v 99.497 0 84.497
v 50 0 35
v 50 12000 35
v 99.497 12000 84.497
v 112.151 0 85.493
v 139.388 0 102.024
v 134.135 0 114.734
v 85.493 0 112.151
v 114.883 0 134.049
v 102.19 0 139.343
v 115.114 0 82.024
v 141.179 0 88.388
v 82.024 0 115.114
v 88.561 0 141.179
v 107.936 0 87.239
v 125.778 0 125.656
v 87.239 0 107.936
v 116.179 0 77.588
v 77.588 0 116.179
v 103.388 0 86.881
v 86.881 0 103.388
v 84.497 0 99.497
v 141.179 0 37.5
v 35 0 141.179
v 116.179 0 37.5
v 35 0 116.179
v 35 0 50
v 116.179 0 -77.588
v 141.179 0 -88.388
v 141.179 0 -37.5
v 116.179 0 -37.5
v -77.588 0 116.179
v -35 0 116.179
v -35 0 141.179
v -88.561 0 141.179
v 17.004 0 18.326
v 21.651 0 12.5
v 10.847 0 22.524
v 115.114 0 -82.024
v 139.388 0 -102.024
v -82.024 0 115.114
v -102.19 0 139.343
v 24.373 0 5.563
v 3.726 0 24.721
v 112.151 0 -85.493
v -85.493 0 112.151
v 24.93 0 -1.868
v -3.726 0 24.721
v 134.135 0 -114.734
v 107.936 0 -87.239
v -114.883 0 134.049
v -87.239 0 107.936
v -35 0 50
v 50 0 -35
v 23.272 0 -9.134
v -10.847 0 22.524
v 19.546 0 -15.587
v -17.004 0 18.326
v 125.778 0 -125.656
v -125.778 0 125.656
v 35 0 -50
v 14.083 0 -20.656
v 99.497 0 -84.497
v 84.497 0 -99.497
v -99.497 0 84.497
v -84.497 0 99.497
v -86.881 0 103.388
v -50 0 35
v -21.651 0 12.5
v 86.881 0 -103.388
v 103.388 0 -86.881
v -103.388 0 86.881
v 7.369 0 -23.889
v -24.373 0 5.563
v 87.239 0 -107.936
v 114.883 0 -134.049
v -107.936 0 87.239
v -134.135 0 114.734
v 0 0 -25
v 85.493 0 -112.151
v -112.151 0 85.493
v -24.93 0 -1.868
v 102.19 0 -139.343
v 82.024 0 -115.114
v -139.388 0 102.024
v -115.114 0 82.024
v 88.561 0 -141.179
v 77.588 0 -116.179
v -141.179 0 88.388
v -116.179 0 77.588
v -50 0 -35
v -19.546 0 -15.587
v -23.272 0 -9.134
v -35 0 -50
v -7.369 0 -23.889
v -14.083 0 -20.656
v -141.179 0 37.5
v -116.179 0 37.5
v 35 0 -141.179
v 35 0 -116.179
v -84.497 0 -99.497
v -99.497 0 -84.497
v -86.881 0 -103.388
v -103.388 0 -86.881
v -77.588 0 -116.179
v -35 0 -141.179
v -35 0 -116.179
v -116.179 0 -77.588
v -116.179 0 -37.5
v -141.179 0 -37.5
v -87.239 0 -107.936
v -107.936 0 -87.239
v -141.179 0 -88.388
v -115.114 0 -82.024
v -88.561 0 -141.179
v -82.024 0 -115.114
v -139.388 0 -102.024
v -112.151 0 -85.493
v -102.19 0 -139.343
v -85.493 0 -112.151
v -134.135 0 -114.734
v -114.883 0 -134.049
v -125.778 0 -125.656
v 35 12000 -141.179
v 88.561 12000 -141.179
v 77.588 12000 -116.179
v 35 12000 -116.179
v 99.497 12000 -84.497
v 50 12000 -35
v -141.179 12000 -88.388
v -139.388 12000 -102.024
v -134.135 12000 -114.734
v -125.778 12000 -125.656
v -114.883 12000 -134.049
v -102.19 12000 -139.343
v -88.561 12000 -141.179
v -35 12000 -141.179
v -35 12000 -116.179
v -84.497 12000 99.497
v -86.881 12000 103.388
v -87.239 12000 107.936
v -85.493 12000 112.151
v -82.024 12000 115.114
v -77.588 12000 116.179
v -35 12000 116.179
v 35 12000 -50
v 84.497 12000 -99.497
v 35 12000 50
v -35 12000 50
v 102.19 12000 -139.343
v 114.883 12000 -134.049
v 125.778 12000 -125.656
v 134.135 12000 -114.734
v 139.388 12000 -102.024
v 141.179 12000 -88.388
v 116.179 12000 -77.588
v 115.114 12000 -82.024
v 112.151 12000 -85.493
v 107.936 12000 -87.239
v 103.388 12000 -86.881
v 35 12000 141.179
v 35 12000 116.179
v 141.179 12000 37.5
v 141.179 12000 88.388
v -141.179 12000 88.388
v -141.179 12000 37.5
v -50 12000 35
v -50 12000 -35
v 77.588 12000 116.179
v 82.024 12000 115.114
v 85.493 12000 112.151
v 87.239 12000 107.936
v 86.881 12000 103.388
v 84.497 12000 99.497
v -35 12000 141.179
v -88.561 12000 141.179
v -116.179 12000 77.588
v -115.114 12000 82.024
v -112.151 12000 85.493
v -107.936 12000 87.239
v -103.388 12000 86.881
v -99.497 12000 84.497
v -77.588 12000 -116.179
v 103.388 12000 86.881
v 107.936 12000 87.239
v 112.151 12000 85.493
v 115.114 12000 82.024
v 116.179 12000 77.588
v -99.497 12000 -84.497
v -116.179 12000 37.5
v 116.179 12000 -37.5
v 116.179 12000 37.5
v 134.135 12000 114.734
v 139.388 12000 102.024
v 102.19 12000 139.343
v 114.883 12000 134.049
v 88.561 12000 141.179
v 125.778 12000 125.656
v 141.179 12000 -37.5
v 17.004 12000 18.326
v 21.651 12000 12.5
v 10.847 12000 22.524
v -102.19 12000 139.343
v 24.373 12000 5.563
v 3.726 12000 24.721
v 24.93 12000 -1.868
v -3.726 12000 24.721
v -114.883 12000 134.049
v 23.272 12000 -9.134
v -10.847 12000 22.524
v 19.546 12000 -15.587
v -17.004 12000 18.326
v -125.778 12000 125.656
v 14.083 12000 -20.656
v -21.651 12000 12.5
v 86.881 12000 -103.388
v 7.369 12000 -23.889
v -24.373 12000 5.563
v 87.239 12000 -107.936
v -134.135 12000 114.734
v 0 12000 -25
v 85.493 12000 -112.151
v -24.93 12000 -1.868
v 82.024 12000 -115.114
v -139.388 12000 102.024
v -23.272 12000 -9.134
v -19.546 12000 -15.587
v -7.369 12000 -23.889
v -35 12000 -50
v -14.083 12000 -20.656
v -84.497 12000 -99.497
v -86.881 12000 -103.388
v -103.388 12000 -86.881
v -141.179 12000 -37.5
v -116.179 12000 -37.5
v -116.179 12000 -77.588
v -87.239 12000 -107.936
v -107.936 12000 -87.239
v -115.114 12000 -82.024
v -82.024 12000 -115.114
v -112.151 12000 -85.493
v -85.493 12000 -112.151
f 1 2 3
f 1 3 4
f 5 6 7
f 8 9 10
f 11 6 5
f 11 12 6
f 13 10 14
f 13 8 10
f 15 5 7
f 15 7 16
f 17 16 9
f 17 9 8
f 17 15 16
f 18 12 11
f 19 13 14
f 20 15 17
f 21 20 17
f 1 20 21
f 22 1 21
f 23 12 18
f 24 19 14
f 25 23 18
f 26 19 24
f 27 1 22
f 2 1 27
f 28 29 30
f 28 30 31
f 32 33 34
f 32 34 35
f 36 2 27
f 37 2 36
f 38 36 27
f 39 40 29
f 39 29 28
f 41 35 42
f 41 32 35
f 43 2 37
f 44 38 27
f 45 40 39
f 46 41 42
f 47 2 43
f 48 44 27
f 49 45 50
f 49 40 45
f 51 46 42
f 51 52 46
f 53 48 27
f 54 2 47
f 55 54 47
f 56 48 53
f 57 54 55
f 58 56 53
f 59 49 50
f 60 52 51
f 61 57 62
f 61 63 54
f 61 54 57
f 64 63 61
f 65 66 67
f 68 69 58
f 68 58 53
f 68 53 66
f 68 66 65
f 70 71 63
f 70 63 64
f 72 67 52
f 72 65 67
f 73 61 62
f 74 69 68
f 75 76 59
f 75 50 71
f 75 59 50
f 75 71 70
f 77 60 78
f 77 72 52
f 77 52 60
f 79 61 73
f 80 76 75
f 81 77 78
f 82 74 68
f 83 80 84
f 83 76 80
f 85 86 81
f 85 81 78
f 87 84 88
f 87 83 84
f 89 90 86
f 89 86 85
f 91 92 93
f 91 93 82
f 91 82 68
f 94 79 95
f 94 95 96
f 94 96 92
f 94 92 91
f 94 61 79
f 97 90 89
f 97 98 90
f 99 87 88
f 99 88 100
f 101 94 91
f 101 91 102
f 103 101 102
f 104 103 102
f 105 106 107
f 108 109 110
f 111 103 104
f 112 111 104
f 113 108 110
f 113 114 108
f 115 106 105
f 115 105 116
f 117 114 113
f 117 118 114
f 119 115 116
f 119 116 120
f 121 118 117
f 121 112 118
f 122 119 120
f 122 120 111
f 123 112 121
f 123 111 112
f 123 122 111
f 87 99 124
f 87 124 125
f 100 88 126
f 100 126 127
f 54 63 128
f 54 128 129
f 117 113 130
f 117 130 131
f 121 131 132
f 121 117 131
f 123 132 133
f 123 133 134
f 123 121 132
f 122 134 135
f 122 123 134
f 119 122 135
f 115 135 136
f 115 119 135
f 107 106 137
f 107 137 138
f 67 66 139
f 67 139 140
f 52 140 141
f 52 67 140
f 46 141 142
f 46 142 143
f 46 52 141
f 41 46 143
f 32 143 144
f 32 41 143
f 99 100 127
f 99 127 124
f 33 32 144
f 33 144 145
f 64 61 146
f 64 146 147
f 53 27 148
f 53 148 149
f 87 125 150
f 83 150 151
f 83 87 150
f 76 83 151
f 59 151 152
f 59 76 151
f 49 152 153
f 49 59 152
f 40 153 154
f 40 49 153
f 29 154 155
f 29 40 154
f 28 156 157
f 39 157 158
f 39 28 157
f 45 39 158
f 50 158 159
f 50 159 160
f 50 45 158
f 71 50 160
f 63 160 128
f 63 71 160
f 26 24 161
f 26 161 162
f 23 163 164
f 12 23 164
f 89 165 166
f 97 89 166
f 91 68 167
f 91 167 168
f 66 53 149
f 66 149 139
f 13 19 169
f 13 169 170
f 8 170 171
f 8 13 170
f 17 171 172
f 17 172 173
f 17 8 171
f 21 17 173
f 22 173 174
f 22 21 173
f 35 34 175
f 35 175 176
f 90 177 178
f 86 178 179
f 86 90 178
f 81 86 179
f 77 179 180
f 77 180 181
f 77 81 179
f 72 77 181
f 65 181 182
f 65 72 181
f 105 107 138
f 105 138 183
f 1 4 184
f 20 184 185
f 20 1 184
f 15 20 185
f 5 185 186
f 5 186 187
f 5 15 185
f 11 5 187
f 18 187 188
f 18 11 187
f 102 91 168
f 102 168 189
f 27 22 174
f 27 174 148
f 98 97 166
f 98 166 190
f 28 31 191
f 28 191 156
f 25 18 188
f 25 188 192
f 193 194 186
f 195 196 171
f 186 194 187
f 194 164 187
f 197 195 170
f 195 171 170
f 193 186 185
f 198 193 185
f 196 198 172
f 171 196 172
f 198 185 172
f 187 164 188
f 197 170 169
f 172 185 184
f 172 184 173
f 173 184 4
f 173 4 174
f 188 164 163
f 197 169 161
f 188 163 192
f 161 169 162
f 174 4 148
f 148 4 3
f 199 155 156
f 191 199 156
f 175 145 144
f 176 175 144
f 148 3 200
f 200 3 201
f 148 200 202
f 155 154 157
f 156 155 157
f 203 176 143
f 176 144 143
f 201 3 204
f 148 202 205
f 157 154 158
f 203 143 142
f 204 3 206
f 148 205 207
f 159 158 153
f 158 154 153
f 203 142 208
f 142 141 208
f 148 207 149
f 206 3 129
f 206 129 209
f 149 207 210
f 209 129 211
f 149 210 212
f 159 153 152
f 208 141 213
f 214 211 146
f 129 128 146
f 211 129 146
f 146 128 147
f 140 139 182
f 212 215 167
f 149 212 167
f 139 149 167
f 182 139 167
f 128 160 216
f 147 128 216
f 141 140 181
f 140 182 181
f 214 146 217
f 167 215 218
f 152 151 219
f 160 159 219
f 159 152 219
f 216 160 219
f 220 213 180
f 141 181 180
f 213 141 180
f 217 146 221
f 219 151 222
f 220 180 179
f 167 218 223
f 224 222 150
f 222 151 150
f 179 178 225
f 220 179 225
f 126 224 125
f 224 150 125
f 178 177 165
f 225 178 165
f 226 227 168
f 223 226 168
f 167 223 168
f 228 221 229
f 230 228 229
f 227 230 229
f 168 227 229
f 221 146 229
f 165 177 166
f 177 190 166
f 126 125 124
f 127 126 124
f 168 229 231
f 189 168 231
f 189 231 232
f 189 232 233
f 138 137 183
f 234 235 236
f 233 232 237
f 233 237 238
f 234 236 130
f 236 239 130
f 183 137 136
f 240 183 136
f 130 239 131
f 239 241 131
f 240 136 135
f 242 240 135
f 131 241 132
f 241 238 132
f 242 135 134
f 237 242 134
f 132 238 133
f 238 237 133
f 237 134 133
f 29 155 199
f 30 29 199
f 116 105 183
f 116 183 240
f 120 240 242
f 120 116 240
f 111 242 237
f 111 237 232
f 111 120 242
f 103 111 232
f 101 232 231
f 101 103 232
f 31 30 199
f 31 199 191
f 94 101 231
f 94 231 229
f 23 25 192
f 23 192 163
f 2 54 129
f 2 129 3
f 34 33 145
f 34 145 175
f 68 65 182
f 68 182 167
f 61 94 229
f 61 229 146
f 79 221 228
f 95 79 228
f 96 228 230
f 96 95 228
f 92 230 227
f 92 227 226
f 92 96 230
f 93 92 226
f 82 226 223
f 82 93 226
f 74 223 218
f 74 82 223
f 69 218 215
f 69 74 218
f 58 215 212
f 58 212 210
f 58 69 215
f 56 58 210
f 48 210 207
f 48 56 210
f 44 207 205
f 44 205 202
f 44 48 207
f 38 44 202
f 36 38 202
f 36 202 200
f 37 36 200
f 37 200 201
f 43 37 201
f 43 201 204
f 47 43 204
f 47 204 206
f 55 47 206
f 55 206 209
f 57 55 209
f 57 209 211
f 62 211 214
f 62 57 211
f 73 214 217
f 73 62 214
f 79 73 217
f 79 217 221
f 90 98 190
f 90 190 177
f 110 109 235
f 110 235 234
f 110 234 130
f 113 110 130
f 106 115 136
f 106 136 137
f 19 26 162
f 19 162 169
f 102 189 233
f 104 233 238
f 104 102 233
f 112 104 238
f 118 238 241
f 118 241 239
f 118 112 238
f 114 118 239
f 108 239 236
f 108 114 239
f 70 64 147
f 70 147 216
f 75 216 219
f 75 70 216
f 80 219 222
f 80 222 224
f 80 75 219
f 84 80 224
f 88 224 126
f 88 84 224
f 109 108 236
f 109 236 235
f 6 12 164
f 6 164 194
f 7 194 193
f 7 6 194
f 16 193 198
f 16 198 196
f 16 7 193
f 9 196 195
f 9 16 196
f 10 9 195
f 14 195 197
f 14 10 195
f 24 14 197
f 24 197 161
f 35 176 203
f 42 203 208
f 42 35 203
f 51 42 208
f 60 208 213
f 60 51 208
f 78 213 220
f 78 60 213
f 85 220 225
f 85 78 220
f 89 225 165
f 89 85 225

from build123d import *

# Parameters (mm, degrees)
SKETCH1_R           = 25
BOSS_EXTRUDE1_DEPTH = 12000


with BuildPart() as part:
    # Sketch1 → Boss-Extrude1 (new body)
    with BuildSketch(Plane(origin=(0, 0, 0), x_dir=(1, 0, 0), z_dir=(0, 1, 0))):
        with BuildLine():
            Line((-35, 50), (35, 50))
            Line((35, 50), (84.497474683, 99.497474683))
            ThreePointArc((84.497474683, 99.497474683), (86.61573408, 110.146683804), (77.587770512, 116.178976204))
            Line((77.587770512, 116.178976204), (35, 116.178976204))
            Line((35, 116.178976204), (35, 141.178976204))
            Line((35, 141.178976204), (88.56067906, 141.178976204))
            ThreePointArc((88.56067906, 141.178976204), (125.778036691, 125.656179819), (141.179257486, 88.388347648))
            Line((141.179257486, 88.388347648), (141.179257486, 37.5))
            Line((141.179257486, 37.5), (116.179257486, 37.5))
            Line((116.179257486, 37.5), (116.179257486, 77.587654002))
            ThreePointArc((116.179257486, 77.587654002), (110.14686337, 86.615769798), (99.497474683, 84.497474683))
            Line((99.497474683, 84.497474683), (50, 35))
            Line((50, 35), (50, -35))
            Line((50, -35), (99.497474683, -84.497474683))
            ThreePointArc((99.497474683, -84.497474683), (110.14686337, -86.615769798), (116.179257486, -77.587654002))
            Line((116.179257486, -77.587654002), (116.179257486, -37.5))
            Line((116.179257486, -37.5), (141.179257486, -37.5))
            Line((141.179257486, -37.5), (141.179257486, -88.388347648))
            ThreePointArc((141.179257486, -88.388347648), (125.778036691, -125.656179819), (88.56067906, -141.178976204))
            Line((88.56067906, -141.178976204), (35, -141.178976204))
            Line((35, -141.178976204), (35, -116.178976204))
            Line((35, -116.178976204), (77.587770512, -116.178976204))
            ThreePointArc((77.587770512, -116.178976204), (86.61573408, -110.146683804), (84.497474683, -99.497474683))
            Line((84.497474683, -99.497474683), (35, -50))
            Line((35, -50), (-35, -50))
            Line((-35, -50), (-84.497474683, -99.497474683))
            ThreePointArc((-84.497474683, -99.497474683), (-86.61573408, -110.146683804), (-77.587770512, -116.178976204))
            Line((-77.587770512, -116.178976204), (-35, -116.178976204))
            Line((-35, -116.178976204), (-35, -141.178976204))
            Line((-35, -141.178976204), (-88.56067906, -141.178976204))
            ThreePointArc((-88.56067906, -141.178976204), (-125.778036691, -125.656179819), (-141.179257486, -88.388347648))
            Line((-141.179257486, -88.388347648), (-141.179257486, -37.5))
            Line((-141.179257486, -37.5), (-116.179257486, -37.5))
            Line((-116.179257486, -37.5), (-116.179257486, -77.587654002))
            ThreePointArc((-116.179257486, -77.587654002), (-110.14686337, -86.615769798), (-99.497474683, -84.497474683))
            Line((-99.497474683, -84.497474683), (-50, -35))
            Line((-50, -35), (-50, 35))
            Line((-50, 35), (-99.497474683, 84.497474683))
            ThreePointArc((-99.497474683, 84.497474683), (-110.14686337, 86.615769798), (-116.179257486, 77.587654002))
            Line((-116.179257486, 77.587654002), (-116.179257486, 37.5))
            Line((-116.179257486, 37.5), (-141.179257486, 37.5))
            Line((-141.179257486, 37.5), (-141.179257486, 88.388347648))
            ThreePointArc((-141.179257486, 88.388347648), (-125.778036691, 125.656179819), (-88.56067906, 141.178976204))
            Line((-88.56067906, 141.178976204), (-35, 141.178976204))
            Line((-35, 141.178976204), (-35, 116.178976204))
            Line((-35, 116.178976204), (-77.587770512, 116.178976204))
            ThreePointArc((-77.587770512, 116.178976204), (-86.61573408, 110.146683804), (-84.497474683, 99.497474683))
            Line((-84.497474683, 99.497474683), (-35, 50))
        make_face()
        with Locations(Location((0, 0, 0), (0, 0, 90))):
            Circle(SKETCH1_R, mode=Mode.SUBTRACT)
    extrude(amount=BOSS_EXTRUDE1_DEPTH)


solid = part.part
